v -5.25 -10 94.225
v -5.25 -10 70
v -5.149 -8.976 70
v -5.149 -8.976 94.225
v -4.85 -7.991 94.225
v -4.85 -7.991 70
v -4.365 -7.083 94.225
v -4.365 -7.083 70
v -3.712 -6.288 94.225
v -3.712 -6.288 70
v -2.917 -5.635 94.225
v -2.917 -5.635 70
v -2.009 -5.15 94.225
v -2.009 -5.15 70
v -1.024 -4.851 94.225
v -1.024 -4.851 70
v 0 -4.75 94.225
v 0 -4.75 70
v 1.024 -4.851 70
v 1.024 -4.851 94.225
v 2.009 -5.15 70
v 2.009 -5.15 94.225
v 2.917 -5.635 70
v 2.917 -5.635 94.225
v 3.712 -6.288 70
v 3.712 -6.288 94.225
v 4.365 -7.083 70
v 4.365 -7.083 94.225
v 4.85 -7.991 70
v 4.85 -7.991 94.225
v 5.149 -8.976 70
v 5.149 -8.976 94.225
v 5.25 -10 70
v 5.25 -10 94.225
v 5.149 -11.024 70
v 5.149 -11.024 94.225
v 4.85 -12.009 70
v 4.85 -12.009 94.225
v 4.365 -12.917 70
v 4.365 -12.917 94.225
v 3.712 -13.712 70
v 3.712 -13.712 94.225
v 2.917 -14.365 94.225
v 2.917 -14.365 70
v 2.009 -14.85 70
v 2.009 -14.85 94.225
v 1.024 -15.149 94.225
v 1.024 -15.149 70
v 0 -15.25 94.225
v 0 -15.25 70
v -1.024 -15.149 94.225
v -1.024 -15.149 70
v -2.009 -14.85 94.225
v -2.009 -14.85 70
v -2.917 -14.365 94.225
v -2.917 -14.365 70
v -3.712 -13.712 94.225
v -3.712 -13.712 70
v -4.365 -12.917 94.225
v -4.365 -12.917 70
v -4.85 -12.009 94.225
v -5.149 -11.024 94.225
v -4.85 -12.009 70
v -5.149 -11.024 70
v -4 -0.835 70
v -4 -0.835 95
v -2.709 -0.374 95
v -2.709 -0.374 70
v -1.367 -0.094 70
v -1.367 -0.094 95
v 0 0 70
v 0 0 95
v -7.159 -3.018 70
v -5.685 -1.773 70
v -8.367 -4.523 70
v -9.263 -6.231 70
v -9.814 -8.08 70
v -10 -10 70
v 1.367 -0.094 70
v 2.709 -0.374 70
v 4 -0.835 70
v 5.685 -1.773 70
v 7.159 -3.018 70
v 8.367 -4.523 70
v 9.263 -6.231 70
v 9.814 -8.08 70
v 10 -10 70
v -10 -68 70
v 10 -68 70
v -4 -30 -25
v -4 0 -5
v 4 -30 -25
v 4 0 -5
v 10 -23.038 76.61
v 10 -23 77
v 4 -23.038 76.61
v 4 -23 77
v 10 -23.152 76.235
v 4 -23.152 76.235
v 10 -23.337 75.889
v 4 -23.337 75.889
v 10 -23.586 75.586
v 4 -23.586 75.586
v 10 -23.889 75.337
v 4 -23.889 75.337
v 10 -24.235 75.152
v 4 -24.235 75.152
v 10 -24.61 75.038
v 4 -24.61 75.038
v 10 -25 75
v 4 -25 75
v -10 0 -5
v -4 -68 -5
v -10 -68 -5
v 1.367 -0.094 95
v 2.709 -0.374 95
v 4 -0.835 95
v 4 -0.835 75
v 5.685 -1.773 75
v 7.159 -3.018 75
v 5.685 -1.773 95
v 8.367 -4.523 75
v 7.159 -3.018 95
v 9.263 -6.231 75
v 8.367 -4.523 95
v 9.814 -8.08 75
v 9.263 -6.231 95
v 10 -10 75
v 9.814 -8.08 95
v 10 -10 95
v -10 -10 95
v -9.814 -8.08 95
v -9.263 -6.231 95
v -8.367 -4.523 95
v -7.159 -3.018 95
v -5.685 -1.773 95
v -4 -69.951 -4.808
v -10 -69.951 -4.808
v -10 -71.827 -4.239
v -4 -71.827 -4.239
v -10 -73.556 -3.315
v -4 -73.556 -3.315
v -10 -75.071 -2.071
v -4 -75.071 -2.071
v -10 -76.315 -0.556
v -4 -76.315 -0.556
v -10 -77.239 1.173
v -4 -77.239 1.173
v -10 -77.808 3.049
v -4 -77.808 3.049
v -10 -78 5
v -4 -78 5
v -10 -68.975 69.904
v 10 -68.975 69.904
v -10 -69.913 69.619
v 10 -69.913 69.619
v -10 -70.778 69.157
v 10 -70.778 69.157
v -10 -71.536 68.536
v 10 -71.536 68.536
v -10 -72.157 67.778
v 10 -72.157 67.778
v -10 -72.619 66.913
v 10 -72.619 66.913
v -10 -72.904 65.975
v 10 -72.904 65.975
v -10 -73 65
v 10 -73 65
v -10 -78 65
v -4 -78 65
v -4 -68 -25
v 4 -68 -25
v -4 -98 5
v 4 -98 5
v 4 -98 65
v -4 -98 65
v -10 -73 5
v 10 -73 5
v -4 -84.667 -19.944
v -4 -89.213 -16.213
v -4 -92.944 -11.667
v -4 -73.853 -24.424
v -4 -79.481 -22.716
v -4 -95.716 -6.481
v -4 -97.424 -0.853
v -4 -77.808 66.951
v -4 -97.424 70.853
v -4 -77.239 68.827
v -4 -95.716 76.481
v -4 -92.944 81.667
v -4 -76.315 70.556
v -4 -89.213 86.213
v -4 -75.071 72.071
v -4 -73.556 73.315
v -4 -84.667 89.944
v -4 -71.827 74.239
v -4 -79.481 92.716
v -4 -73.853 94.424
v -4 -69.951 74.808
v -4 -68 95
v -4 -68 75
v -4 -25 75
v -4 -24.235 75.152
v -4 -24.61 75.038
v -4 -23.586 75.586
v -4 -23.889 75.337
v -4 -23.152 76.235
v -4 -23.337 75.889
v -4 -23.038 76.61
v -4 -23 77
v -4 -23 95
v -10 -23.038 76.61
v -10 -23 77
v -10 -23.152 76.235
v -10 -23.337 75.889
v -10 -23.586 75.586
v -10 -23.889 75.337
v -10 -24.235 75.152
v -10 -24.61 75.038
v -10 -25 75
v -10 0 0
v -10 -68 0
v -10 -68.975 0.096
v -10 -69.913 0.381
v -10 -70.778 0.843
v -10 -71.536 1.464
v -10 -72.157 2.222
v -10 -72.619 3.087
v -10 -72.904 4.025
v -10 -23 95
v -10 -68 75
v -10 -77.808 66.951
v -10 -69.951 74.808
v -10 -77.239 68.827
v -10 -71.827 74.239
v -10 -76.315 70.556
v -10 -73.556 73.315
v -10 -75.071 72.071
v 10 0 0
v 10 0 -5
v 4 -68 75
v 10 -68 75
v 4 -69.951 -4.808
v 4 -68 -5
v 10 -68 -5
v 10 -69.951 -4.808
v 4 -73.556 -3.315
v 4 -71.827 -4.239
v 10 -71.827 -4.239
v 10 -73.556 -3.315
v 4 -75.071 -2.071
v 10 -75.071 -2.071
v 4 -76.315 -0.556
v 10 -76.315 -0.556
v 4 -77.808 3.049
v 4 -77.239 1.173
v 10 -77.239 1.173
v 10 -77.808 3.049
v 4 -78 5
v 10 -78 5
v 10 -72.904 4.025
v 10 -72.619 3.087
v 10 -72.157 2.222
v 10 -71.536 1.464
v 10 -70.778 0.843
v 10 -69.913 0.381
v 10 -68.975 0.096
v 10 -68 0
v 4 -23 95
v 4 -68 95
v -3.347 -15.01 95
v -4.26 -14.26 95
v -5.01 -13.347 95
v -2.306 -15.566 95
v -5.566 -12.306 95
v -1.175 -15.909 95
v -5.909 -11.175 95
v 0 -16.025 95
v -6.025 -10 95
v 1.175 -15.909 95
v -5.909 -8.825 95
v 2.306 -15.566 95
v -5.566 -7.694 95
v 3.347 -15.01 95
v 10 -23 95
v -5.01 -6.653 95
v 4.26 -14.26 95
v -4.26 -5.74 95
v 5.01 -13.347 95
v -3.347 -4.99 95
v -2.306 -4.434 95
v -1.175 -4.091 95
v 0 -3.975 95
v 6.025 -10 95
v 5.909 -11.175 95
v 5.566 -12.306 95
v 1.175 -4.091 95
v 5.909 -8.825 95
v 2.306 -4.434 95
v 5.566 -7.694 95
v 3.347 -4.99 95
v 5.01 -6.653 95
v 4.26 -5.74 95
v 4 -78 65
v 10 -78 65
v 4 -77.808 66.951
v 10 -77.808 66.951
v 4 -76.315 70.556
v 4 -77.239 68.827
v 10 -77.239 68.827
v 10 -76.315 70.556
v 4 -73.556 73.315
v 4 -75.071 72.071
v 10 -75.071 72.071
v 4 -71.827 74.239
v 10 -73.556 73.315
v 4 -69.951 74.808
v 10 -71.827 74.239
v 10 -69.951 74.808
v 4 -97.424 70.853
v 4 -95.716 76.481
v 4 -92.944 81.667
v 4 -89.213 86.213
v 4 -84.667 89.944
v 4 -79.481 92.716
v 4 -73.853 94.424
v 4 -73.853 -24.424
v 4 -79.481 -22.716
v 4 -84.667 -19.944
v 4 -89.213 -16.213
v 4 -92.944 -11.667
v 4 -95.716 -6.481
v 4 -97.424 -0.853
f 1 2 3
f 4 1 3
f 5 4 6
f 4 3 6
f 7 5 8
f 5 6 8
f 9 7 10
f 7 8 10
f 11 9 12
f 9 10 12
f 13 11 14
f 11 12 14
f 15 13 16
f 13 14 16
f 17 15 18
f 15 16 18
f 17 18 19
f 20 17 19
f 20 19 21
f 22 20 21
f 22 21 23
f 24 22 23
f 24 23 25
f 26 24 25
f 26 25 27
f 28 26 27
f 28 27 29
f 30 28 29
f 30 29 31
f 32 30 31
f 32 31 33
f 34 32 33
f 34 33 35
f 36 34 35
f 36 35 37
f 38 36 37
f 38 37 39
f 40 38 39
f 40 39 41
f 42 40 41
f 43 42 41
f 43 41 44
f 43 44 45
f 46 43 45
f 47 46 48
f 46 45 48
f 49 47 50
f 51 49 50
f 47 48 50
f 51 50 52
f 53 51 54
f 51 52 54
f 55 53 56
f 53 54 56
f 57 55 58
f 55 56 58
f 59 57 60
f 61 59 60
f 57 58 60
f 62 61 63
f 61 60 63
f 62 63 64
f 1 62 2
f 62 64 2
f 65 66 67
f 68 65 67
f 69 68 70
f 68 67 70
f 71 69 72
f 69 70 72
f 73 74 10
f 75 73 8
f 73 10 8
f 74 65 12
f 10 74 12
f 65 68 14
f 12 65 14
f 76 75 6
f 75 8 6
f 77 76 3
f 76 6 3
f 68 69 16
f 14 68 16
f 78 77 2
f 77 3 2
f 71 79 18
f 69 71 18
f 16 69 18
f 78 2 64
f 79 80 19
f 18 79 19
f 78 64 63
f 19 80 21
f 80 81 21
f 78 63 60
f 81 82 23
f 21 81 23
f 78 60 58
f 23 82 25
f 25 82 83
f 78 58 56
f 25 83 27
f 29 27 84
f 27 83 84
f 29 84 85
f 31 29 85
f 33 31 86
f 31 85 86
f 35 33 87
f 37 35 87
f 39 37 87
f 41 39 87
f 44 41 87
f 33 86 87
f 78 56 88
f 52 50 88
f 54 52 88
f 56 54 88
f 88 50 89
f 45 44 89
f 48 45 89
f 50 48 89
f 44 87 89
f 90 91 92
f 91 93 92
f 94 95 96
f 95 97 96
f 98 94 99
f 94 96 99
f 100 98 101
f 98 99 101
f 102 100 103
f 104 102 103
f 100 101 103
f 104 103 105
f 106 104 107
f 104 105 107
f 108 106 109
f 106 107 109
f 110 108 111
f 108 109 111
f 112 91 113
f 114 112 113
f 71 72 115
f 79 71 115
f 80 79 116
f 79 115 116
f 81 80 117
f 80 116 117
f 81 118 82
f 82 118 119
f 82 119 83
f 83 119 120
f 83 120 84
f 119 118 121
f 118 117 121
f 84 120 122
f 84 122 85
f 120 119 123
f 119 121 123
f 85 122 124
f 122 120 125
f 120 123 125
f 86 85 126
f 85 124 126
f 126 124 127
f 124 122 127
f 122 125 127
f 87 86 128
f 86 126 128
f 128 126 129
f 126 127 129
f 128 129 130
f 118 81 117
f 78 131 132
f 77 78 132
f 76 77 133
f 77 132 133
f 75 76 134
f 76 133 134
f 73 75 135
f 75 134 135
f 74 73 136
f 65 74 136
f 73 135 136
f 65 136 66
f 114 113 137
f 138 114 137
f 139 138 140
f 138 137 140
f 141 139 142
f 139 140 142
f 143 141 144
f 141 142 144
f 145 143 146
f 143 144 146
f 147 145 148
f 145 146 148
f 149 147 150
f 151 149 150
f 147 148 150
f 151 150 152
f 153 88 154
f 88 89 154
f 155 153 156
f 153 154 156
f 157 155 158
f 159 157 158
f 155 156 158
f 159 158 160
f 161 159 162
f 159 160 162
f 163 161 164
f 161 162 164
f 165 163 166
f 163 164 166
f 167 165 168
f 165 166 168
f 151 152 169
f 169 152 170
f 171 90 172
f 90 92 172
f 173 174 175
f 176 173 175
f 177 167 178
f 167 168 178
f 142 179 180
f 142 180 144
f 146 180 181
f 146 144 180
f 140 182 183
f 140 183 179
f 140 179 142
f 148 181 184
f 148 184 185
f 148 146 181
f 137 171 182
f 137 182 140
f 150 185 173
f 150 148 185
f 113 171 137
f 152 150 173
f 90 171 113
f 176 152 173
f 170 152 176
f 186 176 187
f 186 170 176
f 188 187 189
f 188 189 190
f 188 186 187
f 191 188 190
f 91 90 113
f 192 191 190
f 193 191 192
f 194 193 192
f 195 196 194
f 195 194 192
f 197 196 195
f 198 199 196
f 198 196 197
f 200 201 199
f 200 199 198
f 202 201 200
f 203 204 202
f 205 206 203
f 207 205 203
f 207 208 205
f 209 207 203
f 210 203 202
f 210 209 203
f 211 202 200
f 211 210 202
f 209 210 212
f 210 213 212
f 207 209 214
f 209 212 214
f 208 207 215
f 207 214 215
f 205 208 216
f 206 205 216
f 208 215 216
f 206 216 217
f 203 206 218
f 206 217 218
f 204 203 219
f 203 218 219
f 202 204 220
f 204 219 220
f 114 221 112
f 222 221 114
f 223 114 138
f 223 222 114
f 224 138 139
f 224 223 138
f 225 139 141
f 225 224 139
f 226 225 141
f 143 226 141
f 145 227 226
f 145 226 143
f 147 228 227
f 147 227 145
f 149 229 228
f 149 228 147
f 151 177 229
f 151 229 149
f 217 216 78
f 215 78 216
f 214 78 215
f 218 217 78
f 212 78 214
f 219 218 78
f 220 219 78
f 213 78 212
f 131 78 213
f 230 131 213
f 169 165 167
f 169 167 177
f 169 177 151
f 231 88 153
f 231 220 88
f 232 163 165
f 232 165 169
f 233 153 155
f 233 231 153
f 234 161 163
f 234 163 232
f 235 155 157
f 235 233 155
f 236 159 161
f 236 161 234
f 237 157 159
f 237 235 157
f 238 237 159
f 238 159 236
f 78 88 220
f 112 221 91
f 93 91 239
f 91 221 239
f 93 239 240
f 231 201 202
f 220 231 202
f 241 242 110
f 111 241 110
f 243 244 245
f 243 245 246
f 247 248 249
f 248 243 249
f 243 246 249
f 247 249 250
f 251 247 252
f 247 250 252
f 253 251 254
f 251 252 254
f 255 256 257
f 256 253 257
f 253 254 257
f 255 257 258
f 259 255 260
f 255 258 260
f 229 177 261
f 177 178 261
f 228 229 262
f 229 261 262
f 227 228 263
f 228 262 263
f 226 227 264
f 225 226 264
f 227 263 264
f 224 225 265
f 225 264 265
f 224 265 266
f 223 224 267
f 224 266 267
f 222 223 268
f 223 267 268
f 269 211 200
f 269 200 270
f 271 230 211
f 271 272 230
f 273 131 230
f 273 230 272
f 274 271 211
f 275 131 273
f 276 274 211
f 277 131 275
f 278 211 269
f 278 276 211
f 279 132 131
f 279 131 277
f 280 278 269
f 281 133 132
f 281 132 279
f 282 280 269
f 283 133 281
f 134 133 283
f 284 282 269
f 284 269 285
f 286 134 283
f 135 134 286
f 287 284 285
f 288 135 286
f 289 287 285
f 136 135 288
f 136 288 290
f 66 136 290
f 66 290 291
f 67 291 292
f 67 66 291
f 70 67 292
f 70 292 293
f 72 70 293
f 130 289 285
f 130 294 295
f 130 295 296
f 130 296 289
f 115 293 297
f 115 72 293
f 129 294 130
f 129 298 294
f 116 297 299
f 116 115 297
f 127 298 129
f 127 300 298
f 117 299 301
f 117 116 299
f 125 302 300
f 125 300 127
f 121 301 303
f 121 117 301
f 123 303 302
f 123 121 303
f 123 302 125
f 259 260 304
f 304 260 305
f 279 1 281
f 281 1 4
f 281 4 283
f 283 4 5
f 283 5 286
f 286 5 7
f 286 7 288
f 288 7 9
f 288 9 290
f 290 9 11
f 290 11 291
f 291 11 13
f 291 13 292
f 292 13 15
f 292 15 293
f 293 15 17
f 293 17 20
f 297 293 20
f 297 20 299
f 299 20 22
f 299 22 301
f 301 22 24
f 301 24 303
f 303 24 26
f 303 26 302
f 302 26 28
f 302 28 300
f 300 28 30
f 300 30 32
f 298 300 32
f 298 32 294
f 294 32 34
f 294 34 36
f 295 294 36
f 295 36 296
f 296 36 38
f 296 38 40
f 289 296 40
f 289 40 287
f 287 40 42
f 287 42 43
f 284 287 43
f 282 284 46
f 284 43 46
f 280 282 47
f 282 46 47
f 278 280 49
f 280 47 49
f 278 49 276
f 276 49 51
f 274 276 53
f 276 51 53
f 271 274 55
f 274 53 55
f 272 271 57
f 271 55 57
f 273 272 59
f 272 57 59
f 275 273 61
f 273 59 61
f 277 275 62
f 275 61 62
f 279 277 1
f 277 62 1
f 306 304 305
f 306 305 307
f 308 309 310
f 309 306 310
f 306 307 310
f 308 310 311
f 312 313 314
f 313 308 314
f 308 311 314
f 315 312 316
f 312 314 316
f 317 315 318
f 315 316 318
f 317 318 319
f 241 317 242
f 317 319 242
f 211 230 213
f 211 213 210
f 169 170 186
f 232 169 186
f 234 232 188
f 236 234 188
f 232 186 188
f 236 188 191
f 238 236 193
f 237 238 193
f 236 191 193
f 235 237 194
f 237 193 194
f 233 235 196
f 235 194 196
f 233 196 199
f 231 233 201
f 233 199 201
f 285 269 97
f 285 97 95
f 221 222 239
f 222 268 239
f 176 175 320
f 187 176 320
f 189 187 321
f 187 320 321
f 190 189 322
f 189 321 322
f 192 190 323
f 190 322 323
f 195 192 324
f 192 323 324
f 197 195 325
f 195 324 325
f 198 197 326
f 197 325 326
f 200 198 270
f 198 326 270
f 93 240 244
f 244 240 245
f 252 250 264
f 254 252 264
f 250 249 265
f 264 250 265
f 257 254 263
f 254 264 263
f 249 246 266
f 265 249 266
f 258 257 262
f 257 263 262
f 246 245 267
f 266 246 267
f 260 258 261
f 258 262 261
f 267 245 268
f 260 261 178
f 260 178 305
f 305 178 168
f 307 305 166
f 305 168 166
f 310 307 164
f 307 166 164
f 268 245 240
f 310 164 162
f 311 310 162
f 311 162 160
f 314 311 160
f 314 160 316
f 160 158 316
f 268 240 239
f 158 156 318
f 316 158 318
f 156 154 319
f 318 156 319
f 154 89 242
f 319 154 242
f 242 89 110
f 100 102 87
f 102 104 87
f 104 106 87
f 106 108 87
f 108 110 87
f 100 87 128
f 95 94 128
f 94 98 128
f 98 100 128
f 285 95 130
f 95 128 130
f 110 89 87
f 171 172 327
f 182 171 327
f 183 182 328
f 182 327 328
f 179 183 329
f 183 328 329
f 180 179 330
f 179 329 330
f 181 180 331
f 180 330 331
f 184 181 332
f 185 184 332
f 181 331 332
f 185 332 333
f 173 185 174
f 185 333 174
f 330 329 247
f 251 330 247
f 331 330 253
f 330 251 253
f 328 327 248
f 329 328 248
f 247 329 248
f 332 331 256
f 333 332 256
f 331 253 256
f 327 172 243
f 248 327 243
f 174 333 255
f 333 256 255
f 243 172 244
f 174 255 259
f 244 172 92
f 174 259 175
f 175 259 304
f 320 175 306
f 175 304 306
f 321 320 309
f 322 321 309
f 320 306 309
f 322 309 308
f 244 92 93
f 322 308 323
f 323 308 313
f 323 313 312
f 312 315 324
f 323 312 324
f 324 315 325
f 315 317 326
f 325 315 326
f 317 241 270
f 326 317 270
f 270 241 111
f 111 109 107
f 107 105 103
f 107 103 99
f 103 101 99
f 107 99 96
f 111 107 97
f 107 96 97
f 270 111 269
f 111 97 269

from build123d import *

# Parameters (mm, degrees)
BOSS_EXTRUDE2_DEPTH              = 4
BOSS_EXTRUDE3_DEPTH              = 10
BOSS_EXTRUDE6_DEPTH              = 25
CUT_EXTRUDE3_DEPTH               = 25
M12X1_5_TAPPED_HOLE1_D           = 10.5
M12X1_5_TAPPED_HOLE1_DEPTH       = 25
M12X1_5_TAPPED_HOLE1_CSINK_D     = 12.05
M12X1_5_TAPPED_HOLE1_CSINK_ANGLE = 90
FILLET1_R                        = 2


with BuildPart() as part:
    # Sketch1 → Boss-Extrude2 (new, symmetric)
    with BuildSketch(Plane(origin=(0, 0, 0), x_dir=(0, 0, -1), z_dir=(1, 0, 0))):
        with BuildLine():
            ThreePointArc((-65, -98), (-86.213203, -89.213203), (-95, -68))
            Line((-95, -68), (-95, 0))
            Line((-95, 0), (-75, 0))
            Line((-75, 0), (-75, -68))
            ThreePointArc((-75, -68), (-72.071068, -75.071068), (-65, -78))
            Line((-65, -78), (-5, -78))
            ThreePointArc((-5, -78), (2.071068, -75.071068), (5, -68))
            Line((5, -68), (5, 0))
            Line((5, 0), (25, -30))
            Line((25, -30), (25, -68))
            ThreePointArc((25, -68), (16.213203, -89.213203), (-5, -98))
            Line((-5, -98), (-65, -98))
        make_face()
    extrude(amount=BOSS_EXTRUDE2_DEPTH, both=True)

    # Sketch1<5> → Boss-Extrude3 (add, symmetric)
    with BuildSketch(Plane(origin=(0, 0, 0), x_dir=(0, 0, -1), z_dir=(1, 0, 0))):
        with BuildLine():
            ThreePointArc((-65, -78), (-72.071068, -75.071068), (-75, -68))
            Line((-75, -68), (-75, 0))
            Line((-75, 0), (-70, 0))
            Line((-70, 0), (-70, -68))
            ThreePointArc((-70, -68), (-68.535534, -71.535534), (-65, -73))
            Line((-65, -73), (-5, -73))
            ThreePointArc((-5, -73), (-1.464466, -71.535534), (0, -68))
            Line((0, -68), (0, 0))
            Line((0, 0), (5, 0))
            Line((5, 0), (5, -68))
            ThreePointArc((5, -68), (2.071068, -75.071068), (-5, -78))
            Line((-5, -78), (-65, -78))
        make_face()
    extrude(amount=BOSS_EXTRUDE3_DEPTH, both=True)

    # Sketch2 → Boss-Extrude6 (add)
    with BuildSketch(Plane.XY.offset(95)):
        with BuildLine():
            Line((-10, -10), (-10, -23))
            Line((-10, -23), (10, -23))
            Line((10, -23), (10, -10))
            ThreePointArc((10, -10), (0, 0), (-10, -10))
        make_face()
    extrude(amount=-BOSS_EXTRUDE6_DEPTH)

    # Sketch4 → Cut-Extrude3 (cut)
    with BuildSketch(Plane.XY.offset(95)):
        with BuildLine():
            Line((10, 0), (4, 0))
            Line((4, 0), (4, -0.834849))
            ThreePointArc((4, -0.834849), (8.3666, -4.522774), (10, -10))
            Line((10, -10), (10, 0))
        make_face()
        with BuildLine():
            Line((-10, 0), (-10, -10))
            ThreePointArc((-10, -10), (-8.3666, -4.522774), (-4, -0.834849))
            Line((-4, -0.834849), (-4, 0))
            Line((-4, 0), (-10, 0))
        make_face()
        with BuildLine():
            Line((-4, 0), (-4, -0.834849))
            ThreePointArc((-4, -0.834849), (-2.043096, -0.210937), (0, 0))
            Line((0, 0), (-4, 0))
        make_face()
        with BuildLine():
            Line((4, 0), (0, 0))
            ThreePointArc((0, 0), (2.043096, -0.210937), (4, -0.834849))
            Line((4, -0.834849), (4, 0))
        make_face()
    extrude(amount=-CUT_EXTRUDE3_DEPTH, mode=Mode.SUBTRACT)

    # M12x1.5 Tapped Hole1
    with Locations(Plane.XY.offset(95)):
        with Locations((0, -10)):
            CounterSinkHole(M12X1_5_TAPPED_HOLE1_D / 2, M12X1_5_TAPPED_HOLE1_CSINK_D / 2, depth=M12X1_5_TAPPED_HOLE1_DEPTH, counter_sink_angle=M12X1_5_TAPPED_HOLE1_CSINK_ANGLE)

    # Fillet1
    fillet1_edges = [part.edges().sort_by_distance(p)[0] for p in [
        (-7, -23, 75),
        (7, -23, 75),
    ]]
    fillet(fillet1_edges, radius=FILLET1_R)


solid = part.part
